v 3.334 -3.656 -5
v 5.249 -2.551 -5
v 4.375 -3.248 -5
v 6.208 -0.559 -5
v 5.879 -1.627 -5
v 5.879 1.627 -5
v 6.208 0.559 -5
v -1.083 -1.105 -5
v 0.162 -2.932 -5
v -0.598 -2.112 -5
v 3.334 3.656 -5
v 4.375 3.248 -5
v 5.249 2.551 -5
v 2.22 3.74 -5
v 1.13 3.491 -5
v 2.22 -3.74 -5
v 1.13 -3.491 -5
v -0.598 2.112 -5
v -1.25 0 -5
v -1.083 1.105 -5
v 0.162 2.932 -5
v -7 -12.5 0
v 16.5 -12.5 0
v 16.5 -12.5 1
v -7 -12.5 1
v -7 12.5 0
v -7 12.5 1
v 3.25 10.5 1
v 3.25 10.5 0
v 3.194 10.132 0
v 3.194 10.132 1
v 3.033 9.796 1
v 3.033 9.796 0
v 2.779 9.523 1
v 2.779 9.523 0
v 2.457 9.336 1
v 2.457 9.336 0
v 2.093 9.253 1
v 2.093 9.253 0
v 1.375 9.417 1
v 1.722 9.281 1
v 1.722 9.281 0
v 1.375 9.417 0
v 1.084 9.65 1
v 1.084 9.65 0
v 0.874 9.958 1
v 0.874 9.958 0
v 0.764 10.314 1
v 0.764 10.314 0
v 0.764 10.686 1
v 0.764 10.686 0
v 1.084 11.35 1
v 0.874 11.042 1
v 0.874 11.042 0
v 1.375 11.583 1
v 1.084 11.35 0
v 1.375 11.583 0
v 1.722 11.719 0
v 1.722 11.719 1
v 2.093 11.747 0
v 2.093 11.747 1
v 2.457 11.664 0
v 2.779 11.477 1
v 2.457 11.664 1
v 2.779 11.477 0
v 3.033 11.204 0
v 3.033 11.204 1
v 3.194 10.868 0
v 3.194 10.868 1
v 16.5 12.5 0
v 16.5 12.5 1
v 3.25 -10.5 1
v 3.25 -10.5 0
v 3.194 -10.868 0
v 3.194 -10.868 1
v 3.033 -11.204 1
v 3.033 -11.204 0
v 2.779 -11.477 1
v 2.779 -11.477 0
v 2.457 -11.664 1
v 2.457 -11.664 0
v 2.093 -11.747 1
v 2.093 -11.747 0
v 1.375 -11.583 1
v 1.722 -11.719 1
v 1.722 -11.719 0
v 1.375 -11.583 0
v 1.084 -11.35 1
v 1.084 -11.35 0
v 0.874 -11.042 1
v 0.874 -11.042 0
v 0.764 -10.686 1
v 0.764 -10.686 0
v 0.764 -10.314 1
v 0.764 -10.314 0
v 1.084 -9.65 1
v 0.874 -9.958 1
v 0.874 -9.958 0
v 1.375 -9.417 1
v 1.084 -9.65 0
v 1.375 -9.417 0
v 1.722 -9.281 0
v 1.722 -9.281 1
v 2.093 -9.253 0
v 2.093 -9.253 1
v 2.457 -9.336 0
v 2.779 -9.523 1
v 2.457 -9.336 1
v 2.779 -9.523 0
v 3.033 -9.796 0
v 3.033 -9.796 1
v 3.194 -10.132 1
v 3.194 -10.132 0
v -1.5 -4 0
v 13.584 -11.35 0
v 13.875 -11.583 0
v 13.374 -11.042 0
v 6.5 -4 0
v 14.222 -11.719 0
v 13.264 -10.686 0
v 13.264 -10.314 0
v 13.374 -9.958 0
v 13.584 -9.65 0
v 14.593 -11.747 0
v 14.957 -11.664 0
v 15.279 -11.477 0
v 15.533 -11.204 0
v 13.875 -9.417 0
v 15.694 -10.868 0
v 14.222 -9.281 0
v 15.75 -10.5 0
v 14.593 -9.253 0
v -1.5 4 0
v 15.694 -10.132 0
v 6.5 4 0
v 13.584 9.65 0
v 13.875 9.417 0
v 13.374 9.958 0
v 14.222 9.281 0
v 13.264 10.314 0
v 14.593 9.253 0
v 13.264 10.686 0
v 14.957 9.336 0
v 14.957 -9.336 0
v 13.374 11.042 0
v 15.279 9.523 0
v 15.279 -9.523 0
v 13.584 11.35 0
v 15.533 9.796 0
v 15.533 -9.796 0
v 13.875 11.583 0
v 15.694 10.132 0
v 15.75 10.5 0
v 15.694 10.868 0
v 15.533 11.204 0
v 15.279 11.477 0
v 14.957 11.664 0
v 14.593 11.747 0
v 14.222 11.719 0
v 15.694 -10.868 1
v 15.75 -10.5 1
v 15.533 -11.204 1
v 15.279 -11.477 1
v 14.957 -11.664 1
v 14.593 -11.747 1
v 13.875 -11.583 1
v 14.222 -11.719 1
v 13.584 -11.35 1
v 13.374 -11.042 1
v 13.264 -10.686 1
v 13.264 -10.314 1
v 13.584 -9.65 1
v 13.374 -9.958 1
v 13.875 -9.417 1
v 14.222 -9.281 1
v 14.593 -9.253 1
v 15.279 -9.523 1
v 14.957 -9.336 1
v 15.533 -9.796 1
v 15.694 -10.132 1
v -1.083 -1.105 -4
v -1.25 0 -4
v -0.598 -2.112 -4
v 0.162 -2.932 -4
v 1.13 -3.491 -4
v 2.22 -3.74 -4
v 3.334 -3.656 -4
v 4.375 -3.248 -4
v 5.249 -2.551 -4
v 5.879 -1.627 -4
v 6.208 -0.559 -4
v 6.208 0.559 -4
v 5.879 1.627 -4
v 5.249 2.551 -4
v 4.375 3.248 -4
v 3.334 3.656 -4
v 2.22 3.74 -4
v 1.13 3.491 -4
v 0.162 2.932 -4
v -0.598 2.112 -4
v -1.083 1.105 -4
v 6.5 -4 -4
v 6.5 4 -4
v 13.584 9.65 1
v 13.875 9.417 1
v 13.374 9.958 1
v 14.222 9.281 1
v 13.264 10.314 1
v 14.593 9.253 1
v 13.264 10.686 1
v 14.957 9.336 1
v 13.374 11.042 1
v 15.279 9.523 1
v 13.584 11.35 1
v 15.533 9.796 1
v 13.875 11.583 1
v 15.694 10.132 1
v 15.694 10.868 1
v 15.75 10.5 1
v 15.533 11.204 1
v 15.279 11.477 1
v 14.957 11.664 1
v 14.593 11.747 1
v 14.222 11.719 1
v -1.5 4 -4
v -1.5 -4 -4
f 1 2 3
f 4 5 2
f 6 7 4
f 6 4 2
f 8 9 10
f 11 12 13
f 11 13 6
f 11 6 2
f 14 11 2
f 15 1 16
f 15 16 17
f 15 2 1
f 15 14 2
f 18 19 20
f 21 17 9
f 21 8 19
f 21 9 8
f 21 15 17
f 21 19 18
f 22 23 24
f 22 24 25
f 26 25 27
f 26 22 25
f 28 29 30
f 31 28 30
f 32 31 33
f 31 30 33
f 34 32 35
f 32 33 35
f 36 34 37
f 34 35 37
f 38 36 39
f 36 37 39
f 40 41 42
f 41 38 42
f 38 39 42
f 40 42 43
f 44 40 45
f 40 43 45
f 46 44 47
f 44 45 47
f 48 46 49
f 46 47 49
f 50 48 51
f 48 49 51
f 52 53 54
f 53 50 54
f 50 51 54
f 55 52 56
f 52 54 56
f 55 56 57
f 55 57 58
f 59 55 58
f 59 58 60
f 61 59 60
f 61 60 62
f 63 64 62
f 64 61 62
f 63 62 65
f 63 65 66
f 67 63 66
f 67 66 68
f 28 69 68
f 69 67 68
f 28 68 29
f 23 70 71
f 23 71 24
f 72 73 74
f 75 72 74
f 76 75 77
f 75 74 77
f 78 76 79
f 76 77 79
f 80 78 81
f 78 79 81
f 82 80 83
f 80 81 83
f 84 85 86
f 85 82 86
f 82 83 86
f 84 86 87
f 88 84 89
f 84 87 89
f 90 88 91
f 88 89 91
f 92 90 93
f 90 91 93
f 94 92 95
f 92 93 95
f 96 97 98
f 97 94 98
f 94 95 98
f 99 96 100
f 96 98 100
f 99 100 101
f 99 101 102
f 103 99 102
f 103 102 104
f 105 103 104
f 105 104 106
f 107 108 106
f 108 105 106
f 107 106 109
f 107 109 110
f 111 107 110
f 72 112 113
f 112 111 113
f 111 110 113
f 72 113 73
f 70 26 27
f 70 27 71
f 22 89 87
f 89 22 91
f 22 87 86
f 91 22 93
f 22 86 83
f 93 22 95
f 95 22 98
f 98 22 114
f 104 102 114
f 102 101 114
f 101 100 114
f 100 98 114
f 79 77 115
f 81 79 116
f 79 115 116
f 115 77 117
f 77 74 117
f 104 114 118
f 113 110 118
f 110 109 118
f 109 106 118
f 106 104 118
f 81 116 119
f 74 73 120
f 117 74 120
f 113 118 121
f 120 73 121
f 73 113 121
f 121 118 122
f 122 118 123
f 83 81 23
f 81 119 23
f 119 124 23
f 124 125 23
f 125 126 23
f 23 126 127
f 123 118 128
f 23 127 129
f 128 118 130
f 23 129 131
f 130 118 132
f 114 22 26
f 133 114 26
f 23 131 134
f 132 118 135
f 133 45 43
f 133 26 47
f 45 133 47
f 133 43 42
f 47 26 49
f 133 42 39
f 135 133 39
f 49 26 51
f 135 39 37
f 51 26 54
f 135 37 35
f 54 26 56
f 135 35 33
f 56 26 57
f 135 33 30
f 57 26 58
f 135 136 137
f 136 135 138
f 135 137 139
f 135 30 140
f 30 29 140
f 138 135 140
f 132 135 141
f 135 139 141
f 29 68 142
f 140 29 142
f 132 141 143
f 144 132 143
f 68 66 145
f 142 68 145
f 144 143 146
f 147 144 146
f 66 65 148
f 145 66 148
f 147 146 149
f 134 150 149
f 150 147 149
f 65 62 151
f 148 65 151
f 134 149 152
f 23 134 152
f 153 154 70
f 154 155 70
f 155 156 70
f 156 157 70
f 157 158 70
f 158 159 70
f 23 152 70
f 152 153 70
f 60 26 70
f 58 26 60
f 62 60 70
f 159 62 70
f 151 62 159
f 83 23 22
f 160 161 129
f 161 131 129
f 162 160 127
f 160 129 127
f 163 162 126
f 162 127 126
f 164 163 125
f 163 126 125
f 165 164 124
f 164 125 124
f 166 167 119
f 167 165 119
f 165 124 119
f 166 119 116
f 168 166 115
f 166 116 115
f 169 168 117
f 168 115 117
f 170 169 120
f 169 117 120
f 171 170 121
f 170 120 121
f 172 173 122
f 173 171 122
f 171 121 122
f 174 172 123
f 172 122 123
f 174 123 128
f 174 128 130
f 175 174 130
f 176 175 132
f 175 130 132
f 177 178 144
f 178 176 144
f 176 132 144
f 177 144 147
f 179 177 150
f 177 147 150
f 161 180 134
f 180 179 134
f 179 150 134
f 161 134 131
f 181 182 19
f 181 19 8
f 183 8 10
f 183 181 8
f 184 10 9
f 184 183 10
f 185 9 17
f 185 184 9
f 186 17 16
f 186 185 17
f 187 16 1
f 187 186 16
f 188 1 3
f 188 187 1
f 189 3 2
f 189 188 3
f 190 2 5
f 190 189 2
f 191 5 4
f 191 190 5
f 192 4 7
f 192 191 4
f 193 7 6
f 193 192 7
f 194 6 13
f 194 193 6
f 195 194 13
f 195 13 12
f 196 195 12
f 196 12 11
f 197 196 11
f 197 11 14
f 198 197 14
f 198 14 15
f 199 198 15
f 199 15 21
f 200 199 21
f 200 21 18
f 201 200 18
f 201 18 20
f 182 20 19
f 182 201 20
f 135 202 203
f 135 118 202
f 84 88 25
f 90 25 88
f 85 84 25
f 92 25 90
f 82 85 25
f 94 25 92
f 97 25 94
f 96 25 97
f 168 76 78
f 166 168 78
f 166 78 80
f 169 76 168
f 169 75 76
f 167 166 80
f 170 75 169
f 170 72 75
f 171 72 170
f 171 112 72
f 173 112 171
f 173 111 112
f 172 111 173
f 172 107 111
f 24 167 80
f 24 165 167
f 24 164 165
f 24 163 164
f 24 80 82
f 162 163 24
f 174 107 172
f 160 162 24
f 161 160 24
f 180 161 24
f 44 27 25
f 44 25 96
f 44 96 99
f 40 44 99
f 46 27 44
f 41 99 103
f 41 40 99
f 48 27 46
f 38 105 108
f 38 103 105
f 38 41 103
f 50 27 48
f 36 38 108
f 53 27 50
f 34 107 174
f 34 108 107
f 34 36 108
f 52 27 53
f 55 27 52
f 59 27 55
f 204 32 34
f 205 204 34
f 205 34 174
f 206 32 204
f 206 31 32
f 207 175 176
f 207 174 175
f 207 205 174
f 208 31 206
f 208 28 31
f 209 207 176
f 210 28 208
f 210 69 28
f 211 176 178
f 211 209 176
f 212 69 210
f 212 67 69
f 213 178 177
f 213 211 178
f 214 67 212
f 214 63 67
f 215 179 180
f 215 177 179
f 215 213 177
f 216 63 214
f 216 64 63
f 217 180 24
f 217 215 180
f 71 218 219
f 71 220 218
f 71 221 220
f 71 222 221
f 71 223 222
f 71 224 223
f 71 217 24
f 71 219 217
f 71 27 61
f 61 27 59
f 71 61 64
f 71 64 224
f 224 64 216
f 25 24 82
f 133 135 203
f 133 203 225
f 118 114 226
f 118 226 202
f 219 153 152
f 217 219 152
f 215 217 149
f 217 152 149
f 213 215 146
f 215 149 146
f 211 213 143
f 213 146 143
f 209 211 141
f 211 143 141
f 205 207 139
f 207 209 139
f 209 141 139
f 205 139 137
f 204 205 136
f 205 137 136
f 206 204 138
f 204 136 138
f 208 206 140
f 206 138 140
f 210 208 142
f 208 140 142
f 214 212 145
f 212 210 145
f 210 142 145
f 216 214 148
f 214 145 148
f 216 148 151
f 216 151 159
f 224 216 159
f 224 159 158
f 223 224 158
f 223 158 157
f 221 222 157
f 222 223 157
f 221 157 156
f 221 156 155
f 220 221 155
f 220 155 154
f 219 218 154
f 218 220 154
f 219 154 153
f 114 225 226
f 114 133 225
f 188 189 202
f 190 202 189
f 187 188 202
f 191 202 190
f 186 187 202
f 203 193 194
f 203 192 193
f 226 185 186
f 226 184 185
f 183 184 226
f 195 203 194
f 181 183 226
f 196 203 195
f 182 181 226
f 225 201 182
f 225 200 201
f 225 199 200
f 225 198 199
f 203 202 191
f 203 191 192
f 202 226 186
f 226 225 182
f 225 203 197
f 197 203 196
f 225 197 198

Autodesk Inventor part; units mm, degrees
ref_plane "YZ Plane" through (0, 0, 0) normal (1, 0, 0) x (0, 1, 0)
ref_plane "XZ Plane" through (0, 0, 0) normal (0, 1, 0) x (-1, 0, 0)
ref_plane "XY Plane" through (0, 0, 0) normal (0, 0, 1) x (1, 0, 0)
sketch "スケッチ1" plane through (0, 0, 0) normal (0, 0, 1) x (1, 0, 0)
  circle A0 centre (14.5, 10.5) radius 1.25
  circle A1 centre (14.5, -10.5) radius 1.25
  circle A2 centre (2, -10.5) radius 1.25
  circle A3 centre (2, 10.5) radius 1.25
  circle A4 centre (2.5, 0) radius 7
  line L0 (16.5, 12.5) -> (16.5, -12.5)
  line L1 (16.5, -12.5) -> (-7, -12.5)
  line L2 (-7, -12.5) -> (-7, 12.5)
  line L3 (-7, 12.5) -> (16.5, 12.5)
  circle A5 centre (2.5, 0) radius 7 projected
  circle A6 centre (2, -10.5) radius 2.5 projected
  circle A7 centre (2, 10.5) radius 2.5 projected
  circle A8 centre (14.5, 10.5) radius 2.5 projected
  circle A9 centre (14.5, -10.5) radius 2.5 projected
  point P0 (0, 0)
  dimension "d0" = 2.5
  dimension "d1" = 2.5
  dimension "d2" = 2.5
  dimension "d3" = 2.5
  dimension "d4" = 2
  dimension "d5" = 2
  dimension "d6" = 2
  dimension "d7" = 9
extrude "押し出し1" add sketch "スケッチ1" along normal blind 1 contours A4 | L0 A8 L3 | L0 A8 L3 | L0 A9 L1 A6 L2 L3 A7 A8 | L0 A9 L1 | A7 L3 | L0 L1 A9 | L1 A6 picked at (2.0502, 12.247) picked at (2.0502, -12.247)
sketch "スケッチ2" plane through (0, 0, 0) normal (0, 0, -1) x (-1, 0, 0)
  circle A0 centre (-2, 10.5) radius 1.25 projected
  circle A1 centre (-14.5, -10.5) radius 1.25 projected
  circle A2 centre (-2, -10.5) radius 1.25 projected
  circle A3 centre (-14.5, 10.5) radius 1.25 projected
  circle A4 centre (-2.5, 0) radius 7 projected
  line L0 (17.5, -15.5) -> (-17.5, -15.5) projected
  line L1 (-17.5, 15.5) -> (-17.5, -15.5) projected
  line L2 (-17.5, 15.5) -> (17.5, 15.5) projected
  line L3 (17.5, -15.5) -> (17.5, 15.5) projected
  line L4 (-6.5, 4) -> (1.5, 4)
  line L5 (1.5, 4) -> (1.5, -4)
  line L6 (1.5, -4) -> (-6.5, -4)
  line L7 (-6.5, -4) -> (-6.5, 4)
  line L8 (-6.5, 4) -> (1.5, -4) construction
  line L9 (1.5, 4) -> (-6.5, -4) construction
  point P0 (0, 0)
  dimension "d10" = 8
  dimension "d11" = 8
extrude "押し出し2" add sketch "スケッチ2" along normal blind 4 contours L4 L5 L6 L7
sketch "スケッチ3" plane through (0, 0, -4) normal (0, 0, -1) x (-1, 0, 0)
  circle A0 centre (-2.5, 0) radius 7 projected
  circle A1 centre (-2.5, 0) radius 3.75
  point P0 (0, 0)
  dimension "d14" = 7.5
extrude "押し出し3" add sketch "スケッチ3" along normal blind 1 contours A1
properties part number "camerapi"
